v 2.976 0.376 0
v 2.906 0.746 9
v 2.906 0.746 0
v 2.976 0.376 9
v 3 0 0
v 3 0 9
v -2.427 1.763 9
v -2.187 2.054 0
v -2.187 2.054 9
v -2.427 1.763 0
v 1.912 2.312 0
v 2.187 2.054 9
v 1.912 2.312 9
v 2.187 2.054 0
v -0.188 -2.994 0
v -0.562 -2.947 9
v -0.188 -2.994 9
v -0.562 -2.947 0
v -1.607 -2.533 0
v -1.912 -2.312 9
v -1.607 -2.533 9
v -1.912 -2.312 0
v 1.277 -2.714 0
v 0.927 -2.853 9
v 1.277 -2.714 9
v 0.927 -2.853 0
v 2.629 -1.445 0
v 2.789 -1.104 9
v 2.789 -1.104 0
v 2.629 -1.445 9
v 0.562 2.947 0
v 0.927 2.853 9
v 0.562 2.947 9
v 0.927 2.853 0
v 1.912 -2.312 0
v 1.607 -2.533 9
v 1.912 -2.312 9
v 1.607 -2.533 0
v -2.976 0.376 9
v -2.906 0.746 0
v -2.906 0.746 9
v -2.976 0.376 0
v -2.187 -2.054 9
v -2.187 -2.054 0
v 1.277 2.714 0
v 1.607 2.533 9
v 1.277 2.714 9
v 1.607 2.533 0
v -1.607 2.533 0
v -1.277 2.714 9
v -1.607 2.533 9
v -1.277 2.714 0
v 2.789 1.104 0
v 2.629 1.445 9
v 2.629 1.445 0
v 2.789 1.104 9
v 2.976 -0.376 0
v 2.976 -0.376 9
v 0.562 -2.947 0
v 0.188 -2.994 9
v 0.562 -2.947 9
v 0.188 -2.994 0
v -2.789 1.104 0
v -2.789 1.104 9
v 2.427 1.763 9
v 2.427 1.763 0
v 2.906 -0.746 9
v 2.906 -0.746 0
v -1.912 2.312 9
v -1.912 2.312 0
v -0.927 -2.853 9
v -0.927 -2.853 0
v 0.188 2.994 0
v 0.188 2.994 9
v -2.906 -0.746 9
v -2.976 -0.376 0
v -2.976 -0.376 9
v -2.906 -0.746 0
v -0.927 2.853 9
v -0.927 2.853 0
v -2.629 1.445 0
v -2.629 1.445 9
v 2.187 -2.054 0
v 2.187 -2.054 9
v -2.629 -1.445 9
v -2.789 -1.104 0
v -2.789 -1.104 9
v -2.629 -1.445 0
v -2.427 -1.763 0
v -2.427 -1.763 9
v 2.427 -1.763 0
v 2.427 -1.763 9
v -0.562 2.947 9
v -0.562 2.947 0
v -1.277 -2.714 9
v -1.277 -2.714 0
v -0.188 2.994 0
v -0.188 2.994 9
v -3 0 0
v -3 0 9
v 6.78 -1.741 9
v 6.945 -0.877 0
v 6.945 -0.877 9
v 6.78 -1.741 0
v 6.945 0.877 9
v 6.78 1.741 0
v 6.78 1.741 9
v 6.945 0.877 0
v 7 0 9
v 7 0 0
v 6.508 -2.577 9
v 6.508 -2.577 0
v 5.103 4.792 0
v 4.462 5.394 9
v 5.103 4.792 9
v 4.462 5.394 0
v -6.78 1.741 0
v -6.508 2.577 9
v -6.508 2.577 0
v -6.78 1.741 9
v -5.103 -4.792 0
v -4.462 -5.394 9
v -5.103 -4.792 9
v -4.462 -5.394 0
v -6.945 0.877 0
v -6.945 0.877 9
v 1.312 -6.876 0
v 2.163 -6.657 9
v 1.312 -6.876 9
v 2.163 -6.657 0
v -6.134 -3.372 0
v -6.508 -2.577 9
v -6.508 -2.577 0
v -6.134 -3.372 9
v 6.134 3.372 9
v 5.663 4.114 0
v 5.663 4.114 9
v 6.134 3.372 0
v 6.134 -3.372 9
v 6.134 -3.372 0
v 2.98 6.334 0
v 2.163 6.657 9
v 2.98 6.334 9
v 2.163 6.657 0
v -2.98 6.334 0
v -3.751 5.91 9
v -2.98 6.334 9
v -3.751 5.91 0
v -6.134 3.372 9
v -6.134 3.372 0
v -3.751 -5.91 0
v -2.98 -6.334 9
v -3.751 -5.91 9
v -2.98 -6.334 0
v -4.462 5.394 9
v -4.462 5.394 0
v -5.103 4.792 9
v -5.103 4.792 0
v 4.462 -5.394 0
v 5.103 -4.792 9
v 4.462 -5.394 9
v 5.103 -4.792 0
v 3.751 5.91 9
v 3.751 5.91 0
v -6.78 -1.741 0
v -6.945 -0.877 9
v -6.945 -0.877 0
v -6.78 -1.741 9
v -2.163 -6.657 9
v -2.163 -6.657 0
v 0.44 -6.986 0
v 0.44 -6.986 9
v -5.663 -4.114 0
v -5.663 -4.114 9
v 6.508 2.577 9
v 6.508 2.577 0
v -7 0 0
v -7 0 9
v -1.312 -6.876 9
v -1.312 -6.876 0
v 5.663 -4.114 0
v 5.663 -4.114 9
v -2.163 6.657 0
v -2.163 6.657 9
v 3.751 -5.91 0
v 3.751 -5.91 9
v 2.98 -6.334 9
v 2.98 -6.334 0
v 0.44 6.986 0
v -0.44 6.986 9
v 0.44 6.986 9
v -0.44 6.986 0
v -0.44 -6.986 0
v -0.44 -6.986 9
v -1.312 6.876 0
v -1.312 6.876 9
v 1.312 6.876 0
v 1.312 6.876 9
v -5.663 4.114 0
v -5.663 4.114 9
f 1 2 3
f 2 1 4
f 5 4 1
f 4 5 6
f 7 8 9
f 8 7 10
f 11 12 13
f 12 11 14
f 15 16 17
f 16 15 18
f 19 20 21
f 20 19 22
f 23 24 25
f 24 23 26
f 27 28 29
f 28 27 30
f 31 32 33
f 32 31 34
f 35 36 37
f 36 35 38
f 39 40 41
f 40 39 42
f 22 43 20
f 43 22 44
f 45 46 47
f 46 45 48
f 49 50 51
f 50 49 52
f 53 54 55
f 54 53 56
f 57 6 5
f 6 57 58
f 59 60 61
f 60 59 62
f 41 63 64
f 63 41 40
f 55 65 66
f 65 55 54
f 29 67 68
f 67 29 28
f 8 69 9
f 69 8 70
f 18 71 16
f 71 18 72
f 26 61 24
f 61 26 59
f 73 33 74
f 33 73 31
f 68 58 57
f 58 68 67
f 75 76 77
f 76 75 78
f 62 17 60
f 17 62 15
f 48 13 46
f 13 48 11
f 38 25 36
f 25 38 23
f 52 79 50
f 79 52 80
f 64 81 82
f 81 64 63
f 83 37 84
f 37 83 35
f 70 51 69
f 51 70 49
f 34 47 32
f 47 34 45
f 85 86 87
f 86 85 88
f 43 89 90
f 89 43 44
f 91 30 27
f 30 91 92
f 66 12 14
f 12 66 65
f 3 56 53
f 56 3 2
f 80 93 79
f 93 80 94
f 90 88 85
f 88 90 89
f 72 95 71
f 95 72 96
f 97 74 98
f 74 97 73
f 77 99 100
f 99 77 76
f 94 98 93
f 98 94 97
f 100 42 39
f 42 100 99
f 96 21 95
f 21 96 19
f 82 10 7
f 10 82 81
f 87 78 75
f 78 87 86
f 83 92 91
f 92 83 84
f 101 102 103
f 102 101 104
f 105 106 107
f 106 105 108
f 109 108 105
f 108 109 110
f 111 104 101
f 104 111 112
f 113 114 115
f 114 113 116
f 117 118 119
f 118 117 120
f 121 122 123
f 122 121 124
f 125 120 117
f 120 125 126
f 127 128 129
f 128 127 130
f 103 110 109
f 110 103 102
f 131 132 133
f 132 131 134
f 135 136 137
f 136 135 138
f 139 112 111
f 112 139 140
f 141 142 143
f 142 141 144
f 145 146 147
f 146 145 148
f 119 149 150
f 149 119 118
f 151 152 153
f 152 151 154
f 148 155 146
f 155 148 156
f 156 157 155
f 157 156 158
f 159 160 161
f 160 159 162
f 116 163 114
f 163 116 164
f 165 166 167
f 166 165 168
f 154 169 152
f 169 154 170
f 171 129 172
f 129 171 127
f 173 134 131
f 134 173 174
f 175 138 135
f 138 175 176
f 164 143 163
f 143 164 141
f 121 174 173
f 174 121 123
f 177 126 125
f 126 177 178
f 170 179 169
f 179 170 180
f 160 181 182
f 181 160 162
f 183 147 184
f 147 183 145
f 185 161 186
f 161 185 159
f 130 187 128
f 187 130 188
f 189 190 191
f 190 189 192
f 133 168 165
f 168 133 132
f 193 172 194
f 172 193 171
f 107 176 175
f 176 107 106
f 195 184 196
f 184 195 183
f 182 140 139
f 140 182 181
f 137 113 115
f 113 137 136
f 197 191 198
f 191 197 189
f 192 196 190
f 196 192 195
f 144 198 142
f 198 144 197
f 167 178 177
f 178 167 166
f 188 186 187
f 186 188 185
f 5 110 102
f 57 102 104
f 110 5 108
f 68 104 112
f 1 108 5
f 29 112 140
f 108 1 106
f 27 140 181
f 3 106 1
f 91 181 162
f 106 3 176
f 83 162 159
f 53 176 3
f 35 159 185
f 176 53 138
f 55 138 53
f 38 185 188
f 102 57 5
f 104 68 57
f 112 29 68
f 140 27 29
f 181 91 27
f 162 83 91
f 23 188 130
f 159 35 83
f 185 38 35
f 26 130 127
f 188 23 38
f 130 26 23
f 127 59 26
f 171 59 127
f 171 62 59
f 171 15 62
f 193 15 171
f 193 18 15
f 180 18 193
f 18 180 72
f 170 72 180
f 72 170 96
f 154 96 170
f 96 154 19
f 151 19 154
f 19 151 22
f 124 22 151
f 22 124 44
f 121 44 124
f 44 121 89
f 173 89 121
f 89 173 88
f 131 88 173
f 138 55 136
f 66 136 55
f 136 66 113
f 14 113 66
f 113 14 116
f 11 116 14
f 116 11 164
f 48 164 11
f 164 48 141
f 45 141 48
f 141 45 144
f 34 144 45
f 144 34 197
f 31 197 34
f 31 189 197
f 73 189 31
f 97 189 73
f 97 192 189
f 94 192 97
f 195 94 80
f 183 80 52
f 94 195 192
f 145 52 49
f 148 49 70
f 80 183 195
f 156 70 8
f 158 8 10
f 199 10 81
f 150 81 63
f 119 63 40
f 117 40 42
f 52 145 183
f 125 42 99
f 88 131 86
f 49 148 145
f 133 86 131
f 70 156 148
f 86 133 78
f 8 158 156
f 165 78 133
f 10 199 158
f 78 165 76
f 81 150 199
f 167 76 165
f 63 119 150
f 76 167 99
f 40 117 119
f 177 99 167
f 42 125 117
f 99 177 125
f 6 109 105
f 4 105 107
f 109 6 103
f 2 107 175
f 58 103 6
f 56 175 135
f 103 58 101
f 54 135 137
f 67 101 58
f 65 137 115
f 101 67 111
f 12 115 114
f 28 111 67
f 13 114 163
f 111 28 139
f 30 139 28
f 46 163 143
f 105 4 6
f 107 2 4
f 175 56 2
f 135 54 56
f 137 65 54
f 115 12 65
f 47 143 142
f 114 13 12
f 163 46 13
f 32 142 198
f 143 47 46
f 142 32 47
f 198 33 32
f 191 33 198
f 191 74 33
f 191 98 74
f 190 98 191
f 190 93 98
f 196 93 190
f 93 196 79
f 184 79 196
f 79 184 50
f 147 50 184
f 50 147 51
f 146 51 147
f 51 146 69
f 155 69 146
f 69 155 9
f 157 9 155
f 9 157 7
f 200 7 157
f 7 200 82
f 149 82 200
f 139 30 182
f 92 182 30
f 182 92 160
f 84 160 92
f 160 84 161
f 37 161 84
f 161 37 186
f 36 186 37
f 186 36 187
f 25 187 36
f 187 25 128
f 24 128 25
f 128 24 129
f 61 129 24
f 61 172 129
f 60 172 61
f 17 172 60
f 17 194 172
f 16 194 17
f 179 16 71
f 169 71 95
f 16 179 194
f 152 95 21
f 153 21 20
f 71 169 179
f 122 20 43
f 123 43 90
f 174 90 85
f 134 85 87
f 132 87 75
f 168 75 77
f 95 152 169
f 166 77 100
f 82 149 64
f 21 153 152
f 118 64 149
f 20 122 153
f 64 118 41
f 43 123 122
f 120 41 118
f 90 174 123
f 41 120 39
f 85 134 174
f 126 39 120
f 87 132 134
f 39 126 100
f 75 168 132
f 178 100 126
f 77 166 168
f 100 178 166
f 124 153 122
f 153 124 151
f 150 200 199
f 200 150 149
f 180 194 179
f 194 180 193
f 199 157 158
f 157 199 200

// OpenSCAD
$fn = 50;


difference() {
	union() {
		*color(alpha = 1.0000000000, c = "gray") {
			translate(v = [0, 7, 0]) {
				linear_extrude(height = 1) {
					text(font = "Arial:style=Bold", halign = "center", size = 4.5000000000, text = "COMMENT plate main", valign = "center");
				}
			}
		}
		cylinder(h = 9, r = 7.0000000000);
	}
	union() {
		*color(alpha = 1.0000000000, c = "gray") {
			translate(v = [0, 7, 0]) {
				linear_extrude(height = 1) {
					text(font = "Arial:style=Bold", halign = "center", size = 4.5000000000, text = "COMMENT holes main", valign = "center");
				}
			}
		}
		translate(v = [0, 0, -100]) {
			cylinder(h = 200, r = 3.0000000000);
		}
		translate(v = [0, 0, -100]) {
			cylinder(h = 200, r = 1.5000000000);
		}
	}
}
